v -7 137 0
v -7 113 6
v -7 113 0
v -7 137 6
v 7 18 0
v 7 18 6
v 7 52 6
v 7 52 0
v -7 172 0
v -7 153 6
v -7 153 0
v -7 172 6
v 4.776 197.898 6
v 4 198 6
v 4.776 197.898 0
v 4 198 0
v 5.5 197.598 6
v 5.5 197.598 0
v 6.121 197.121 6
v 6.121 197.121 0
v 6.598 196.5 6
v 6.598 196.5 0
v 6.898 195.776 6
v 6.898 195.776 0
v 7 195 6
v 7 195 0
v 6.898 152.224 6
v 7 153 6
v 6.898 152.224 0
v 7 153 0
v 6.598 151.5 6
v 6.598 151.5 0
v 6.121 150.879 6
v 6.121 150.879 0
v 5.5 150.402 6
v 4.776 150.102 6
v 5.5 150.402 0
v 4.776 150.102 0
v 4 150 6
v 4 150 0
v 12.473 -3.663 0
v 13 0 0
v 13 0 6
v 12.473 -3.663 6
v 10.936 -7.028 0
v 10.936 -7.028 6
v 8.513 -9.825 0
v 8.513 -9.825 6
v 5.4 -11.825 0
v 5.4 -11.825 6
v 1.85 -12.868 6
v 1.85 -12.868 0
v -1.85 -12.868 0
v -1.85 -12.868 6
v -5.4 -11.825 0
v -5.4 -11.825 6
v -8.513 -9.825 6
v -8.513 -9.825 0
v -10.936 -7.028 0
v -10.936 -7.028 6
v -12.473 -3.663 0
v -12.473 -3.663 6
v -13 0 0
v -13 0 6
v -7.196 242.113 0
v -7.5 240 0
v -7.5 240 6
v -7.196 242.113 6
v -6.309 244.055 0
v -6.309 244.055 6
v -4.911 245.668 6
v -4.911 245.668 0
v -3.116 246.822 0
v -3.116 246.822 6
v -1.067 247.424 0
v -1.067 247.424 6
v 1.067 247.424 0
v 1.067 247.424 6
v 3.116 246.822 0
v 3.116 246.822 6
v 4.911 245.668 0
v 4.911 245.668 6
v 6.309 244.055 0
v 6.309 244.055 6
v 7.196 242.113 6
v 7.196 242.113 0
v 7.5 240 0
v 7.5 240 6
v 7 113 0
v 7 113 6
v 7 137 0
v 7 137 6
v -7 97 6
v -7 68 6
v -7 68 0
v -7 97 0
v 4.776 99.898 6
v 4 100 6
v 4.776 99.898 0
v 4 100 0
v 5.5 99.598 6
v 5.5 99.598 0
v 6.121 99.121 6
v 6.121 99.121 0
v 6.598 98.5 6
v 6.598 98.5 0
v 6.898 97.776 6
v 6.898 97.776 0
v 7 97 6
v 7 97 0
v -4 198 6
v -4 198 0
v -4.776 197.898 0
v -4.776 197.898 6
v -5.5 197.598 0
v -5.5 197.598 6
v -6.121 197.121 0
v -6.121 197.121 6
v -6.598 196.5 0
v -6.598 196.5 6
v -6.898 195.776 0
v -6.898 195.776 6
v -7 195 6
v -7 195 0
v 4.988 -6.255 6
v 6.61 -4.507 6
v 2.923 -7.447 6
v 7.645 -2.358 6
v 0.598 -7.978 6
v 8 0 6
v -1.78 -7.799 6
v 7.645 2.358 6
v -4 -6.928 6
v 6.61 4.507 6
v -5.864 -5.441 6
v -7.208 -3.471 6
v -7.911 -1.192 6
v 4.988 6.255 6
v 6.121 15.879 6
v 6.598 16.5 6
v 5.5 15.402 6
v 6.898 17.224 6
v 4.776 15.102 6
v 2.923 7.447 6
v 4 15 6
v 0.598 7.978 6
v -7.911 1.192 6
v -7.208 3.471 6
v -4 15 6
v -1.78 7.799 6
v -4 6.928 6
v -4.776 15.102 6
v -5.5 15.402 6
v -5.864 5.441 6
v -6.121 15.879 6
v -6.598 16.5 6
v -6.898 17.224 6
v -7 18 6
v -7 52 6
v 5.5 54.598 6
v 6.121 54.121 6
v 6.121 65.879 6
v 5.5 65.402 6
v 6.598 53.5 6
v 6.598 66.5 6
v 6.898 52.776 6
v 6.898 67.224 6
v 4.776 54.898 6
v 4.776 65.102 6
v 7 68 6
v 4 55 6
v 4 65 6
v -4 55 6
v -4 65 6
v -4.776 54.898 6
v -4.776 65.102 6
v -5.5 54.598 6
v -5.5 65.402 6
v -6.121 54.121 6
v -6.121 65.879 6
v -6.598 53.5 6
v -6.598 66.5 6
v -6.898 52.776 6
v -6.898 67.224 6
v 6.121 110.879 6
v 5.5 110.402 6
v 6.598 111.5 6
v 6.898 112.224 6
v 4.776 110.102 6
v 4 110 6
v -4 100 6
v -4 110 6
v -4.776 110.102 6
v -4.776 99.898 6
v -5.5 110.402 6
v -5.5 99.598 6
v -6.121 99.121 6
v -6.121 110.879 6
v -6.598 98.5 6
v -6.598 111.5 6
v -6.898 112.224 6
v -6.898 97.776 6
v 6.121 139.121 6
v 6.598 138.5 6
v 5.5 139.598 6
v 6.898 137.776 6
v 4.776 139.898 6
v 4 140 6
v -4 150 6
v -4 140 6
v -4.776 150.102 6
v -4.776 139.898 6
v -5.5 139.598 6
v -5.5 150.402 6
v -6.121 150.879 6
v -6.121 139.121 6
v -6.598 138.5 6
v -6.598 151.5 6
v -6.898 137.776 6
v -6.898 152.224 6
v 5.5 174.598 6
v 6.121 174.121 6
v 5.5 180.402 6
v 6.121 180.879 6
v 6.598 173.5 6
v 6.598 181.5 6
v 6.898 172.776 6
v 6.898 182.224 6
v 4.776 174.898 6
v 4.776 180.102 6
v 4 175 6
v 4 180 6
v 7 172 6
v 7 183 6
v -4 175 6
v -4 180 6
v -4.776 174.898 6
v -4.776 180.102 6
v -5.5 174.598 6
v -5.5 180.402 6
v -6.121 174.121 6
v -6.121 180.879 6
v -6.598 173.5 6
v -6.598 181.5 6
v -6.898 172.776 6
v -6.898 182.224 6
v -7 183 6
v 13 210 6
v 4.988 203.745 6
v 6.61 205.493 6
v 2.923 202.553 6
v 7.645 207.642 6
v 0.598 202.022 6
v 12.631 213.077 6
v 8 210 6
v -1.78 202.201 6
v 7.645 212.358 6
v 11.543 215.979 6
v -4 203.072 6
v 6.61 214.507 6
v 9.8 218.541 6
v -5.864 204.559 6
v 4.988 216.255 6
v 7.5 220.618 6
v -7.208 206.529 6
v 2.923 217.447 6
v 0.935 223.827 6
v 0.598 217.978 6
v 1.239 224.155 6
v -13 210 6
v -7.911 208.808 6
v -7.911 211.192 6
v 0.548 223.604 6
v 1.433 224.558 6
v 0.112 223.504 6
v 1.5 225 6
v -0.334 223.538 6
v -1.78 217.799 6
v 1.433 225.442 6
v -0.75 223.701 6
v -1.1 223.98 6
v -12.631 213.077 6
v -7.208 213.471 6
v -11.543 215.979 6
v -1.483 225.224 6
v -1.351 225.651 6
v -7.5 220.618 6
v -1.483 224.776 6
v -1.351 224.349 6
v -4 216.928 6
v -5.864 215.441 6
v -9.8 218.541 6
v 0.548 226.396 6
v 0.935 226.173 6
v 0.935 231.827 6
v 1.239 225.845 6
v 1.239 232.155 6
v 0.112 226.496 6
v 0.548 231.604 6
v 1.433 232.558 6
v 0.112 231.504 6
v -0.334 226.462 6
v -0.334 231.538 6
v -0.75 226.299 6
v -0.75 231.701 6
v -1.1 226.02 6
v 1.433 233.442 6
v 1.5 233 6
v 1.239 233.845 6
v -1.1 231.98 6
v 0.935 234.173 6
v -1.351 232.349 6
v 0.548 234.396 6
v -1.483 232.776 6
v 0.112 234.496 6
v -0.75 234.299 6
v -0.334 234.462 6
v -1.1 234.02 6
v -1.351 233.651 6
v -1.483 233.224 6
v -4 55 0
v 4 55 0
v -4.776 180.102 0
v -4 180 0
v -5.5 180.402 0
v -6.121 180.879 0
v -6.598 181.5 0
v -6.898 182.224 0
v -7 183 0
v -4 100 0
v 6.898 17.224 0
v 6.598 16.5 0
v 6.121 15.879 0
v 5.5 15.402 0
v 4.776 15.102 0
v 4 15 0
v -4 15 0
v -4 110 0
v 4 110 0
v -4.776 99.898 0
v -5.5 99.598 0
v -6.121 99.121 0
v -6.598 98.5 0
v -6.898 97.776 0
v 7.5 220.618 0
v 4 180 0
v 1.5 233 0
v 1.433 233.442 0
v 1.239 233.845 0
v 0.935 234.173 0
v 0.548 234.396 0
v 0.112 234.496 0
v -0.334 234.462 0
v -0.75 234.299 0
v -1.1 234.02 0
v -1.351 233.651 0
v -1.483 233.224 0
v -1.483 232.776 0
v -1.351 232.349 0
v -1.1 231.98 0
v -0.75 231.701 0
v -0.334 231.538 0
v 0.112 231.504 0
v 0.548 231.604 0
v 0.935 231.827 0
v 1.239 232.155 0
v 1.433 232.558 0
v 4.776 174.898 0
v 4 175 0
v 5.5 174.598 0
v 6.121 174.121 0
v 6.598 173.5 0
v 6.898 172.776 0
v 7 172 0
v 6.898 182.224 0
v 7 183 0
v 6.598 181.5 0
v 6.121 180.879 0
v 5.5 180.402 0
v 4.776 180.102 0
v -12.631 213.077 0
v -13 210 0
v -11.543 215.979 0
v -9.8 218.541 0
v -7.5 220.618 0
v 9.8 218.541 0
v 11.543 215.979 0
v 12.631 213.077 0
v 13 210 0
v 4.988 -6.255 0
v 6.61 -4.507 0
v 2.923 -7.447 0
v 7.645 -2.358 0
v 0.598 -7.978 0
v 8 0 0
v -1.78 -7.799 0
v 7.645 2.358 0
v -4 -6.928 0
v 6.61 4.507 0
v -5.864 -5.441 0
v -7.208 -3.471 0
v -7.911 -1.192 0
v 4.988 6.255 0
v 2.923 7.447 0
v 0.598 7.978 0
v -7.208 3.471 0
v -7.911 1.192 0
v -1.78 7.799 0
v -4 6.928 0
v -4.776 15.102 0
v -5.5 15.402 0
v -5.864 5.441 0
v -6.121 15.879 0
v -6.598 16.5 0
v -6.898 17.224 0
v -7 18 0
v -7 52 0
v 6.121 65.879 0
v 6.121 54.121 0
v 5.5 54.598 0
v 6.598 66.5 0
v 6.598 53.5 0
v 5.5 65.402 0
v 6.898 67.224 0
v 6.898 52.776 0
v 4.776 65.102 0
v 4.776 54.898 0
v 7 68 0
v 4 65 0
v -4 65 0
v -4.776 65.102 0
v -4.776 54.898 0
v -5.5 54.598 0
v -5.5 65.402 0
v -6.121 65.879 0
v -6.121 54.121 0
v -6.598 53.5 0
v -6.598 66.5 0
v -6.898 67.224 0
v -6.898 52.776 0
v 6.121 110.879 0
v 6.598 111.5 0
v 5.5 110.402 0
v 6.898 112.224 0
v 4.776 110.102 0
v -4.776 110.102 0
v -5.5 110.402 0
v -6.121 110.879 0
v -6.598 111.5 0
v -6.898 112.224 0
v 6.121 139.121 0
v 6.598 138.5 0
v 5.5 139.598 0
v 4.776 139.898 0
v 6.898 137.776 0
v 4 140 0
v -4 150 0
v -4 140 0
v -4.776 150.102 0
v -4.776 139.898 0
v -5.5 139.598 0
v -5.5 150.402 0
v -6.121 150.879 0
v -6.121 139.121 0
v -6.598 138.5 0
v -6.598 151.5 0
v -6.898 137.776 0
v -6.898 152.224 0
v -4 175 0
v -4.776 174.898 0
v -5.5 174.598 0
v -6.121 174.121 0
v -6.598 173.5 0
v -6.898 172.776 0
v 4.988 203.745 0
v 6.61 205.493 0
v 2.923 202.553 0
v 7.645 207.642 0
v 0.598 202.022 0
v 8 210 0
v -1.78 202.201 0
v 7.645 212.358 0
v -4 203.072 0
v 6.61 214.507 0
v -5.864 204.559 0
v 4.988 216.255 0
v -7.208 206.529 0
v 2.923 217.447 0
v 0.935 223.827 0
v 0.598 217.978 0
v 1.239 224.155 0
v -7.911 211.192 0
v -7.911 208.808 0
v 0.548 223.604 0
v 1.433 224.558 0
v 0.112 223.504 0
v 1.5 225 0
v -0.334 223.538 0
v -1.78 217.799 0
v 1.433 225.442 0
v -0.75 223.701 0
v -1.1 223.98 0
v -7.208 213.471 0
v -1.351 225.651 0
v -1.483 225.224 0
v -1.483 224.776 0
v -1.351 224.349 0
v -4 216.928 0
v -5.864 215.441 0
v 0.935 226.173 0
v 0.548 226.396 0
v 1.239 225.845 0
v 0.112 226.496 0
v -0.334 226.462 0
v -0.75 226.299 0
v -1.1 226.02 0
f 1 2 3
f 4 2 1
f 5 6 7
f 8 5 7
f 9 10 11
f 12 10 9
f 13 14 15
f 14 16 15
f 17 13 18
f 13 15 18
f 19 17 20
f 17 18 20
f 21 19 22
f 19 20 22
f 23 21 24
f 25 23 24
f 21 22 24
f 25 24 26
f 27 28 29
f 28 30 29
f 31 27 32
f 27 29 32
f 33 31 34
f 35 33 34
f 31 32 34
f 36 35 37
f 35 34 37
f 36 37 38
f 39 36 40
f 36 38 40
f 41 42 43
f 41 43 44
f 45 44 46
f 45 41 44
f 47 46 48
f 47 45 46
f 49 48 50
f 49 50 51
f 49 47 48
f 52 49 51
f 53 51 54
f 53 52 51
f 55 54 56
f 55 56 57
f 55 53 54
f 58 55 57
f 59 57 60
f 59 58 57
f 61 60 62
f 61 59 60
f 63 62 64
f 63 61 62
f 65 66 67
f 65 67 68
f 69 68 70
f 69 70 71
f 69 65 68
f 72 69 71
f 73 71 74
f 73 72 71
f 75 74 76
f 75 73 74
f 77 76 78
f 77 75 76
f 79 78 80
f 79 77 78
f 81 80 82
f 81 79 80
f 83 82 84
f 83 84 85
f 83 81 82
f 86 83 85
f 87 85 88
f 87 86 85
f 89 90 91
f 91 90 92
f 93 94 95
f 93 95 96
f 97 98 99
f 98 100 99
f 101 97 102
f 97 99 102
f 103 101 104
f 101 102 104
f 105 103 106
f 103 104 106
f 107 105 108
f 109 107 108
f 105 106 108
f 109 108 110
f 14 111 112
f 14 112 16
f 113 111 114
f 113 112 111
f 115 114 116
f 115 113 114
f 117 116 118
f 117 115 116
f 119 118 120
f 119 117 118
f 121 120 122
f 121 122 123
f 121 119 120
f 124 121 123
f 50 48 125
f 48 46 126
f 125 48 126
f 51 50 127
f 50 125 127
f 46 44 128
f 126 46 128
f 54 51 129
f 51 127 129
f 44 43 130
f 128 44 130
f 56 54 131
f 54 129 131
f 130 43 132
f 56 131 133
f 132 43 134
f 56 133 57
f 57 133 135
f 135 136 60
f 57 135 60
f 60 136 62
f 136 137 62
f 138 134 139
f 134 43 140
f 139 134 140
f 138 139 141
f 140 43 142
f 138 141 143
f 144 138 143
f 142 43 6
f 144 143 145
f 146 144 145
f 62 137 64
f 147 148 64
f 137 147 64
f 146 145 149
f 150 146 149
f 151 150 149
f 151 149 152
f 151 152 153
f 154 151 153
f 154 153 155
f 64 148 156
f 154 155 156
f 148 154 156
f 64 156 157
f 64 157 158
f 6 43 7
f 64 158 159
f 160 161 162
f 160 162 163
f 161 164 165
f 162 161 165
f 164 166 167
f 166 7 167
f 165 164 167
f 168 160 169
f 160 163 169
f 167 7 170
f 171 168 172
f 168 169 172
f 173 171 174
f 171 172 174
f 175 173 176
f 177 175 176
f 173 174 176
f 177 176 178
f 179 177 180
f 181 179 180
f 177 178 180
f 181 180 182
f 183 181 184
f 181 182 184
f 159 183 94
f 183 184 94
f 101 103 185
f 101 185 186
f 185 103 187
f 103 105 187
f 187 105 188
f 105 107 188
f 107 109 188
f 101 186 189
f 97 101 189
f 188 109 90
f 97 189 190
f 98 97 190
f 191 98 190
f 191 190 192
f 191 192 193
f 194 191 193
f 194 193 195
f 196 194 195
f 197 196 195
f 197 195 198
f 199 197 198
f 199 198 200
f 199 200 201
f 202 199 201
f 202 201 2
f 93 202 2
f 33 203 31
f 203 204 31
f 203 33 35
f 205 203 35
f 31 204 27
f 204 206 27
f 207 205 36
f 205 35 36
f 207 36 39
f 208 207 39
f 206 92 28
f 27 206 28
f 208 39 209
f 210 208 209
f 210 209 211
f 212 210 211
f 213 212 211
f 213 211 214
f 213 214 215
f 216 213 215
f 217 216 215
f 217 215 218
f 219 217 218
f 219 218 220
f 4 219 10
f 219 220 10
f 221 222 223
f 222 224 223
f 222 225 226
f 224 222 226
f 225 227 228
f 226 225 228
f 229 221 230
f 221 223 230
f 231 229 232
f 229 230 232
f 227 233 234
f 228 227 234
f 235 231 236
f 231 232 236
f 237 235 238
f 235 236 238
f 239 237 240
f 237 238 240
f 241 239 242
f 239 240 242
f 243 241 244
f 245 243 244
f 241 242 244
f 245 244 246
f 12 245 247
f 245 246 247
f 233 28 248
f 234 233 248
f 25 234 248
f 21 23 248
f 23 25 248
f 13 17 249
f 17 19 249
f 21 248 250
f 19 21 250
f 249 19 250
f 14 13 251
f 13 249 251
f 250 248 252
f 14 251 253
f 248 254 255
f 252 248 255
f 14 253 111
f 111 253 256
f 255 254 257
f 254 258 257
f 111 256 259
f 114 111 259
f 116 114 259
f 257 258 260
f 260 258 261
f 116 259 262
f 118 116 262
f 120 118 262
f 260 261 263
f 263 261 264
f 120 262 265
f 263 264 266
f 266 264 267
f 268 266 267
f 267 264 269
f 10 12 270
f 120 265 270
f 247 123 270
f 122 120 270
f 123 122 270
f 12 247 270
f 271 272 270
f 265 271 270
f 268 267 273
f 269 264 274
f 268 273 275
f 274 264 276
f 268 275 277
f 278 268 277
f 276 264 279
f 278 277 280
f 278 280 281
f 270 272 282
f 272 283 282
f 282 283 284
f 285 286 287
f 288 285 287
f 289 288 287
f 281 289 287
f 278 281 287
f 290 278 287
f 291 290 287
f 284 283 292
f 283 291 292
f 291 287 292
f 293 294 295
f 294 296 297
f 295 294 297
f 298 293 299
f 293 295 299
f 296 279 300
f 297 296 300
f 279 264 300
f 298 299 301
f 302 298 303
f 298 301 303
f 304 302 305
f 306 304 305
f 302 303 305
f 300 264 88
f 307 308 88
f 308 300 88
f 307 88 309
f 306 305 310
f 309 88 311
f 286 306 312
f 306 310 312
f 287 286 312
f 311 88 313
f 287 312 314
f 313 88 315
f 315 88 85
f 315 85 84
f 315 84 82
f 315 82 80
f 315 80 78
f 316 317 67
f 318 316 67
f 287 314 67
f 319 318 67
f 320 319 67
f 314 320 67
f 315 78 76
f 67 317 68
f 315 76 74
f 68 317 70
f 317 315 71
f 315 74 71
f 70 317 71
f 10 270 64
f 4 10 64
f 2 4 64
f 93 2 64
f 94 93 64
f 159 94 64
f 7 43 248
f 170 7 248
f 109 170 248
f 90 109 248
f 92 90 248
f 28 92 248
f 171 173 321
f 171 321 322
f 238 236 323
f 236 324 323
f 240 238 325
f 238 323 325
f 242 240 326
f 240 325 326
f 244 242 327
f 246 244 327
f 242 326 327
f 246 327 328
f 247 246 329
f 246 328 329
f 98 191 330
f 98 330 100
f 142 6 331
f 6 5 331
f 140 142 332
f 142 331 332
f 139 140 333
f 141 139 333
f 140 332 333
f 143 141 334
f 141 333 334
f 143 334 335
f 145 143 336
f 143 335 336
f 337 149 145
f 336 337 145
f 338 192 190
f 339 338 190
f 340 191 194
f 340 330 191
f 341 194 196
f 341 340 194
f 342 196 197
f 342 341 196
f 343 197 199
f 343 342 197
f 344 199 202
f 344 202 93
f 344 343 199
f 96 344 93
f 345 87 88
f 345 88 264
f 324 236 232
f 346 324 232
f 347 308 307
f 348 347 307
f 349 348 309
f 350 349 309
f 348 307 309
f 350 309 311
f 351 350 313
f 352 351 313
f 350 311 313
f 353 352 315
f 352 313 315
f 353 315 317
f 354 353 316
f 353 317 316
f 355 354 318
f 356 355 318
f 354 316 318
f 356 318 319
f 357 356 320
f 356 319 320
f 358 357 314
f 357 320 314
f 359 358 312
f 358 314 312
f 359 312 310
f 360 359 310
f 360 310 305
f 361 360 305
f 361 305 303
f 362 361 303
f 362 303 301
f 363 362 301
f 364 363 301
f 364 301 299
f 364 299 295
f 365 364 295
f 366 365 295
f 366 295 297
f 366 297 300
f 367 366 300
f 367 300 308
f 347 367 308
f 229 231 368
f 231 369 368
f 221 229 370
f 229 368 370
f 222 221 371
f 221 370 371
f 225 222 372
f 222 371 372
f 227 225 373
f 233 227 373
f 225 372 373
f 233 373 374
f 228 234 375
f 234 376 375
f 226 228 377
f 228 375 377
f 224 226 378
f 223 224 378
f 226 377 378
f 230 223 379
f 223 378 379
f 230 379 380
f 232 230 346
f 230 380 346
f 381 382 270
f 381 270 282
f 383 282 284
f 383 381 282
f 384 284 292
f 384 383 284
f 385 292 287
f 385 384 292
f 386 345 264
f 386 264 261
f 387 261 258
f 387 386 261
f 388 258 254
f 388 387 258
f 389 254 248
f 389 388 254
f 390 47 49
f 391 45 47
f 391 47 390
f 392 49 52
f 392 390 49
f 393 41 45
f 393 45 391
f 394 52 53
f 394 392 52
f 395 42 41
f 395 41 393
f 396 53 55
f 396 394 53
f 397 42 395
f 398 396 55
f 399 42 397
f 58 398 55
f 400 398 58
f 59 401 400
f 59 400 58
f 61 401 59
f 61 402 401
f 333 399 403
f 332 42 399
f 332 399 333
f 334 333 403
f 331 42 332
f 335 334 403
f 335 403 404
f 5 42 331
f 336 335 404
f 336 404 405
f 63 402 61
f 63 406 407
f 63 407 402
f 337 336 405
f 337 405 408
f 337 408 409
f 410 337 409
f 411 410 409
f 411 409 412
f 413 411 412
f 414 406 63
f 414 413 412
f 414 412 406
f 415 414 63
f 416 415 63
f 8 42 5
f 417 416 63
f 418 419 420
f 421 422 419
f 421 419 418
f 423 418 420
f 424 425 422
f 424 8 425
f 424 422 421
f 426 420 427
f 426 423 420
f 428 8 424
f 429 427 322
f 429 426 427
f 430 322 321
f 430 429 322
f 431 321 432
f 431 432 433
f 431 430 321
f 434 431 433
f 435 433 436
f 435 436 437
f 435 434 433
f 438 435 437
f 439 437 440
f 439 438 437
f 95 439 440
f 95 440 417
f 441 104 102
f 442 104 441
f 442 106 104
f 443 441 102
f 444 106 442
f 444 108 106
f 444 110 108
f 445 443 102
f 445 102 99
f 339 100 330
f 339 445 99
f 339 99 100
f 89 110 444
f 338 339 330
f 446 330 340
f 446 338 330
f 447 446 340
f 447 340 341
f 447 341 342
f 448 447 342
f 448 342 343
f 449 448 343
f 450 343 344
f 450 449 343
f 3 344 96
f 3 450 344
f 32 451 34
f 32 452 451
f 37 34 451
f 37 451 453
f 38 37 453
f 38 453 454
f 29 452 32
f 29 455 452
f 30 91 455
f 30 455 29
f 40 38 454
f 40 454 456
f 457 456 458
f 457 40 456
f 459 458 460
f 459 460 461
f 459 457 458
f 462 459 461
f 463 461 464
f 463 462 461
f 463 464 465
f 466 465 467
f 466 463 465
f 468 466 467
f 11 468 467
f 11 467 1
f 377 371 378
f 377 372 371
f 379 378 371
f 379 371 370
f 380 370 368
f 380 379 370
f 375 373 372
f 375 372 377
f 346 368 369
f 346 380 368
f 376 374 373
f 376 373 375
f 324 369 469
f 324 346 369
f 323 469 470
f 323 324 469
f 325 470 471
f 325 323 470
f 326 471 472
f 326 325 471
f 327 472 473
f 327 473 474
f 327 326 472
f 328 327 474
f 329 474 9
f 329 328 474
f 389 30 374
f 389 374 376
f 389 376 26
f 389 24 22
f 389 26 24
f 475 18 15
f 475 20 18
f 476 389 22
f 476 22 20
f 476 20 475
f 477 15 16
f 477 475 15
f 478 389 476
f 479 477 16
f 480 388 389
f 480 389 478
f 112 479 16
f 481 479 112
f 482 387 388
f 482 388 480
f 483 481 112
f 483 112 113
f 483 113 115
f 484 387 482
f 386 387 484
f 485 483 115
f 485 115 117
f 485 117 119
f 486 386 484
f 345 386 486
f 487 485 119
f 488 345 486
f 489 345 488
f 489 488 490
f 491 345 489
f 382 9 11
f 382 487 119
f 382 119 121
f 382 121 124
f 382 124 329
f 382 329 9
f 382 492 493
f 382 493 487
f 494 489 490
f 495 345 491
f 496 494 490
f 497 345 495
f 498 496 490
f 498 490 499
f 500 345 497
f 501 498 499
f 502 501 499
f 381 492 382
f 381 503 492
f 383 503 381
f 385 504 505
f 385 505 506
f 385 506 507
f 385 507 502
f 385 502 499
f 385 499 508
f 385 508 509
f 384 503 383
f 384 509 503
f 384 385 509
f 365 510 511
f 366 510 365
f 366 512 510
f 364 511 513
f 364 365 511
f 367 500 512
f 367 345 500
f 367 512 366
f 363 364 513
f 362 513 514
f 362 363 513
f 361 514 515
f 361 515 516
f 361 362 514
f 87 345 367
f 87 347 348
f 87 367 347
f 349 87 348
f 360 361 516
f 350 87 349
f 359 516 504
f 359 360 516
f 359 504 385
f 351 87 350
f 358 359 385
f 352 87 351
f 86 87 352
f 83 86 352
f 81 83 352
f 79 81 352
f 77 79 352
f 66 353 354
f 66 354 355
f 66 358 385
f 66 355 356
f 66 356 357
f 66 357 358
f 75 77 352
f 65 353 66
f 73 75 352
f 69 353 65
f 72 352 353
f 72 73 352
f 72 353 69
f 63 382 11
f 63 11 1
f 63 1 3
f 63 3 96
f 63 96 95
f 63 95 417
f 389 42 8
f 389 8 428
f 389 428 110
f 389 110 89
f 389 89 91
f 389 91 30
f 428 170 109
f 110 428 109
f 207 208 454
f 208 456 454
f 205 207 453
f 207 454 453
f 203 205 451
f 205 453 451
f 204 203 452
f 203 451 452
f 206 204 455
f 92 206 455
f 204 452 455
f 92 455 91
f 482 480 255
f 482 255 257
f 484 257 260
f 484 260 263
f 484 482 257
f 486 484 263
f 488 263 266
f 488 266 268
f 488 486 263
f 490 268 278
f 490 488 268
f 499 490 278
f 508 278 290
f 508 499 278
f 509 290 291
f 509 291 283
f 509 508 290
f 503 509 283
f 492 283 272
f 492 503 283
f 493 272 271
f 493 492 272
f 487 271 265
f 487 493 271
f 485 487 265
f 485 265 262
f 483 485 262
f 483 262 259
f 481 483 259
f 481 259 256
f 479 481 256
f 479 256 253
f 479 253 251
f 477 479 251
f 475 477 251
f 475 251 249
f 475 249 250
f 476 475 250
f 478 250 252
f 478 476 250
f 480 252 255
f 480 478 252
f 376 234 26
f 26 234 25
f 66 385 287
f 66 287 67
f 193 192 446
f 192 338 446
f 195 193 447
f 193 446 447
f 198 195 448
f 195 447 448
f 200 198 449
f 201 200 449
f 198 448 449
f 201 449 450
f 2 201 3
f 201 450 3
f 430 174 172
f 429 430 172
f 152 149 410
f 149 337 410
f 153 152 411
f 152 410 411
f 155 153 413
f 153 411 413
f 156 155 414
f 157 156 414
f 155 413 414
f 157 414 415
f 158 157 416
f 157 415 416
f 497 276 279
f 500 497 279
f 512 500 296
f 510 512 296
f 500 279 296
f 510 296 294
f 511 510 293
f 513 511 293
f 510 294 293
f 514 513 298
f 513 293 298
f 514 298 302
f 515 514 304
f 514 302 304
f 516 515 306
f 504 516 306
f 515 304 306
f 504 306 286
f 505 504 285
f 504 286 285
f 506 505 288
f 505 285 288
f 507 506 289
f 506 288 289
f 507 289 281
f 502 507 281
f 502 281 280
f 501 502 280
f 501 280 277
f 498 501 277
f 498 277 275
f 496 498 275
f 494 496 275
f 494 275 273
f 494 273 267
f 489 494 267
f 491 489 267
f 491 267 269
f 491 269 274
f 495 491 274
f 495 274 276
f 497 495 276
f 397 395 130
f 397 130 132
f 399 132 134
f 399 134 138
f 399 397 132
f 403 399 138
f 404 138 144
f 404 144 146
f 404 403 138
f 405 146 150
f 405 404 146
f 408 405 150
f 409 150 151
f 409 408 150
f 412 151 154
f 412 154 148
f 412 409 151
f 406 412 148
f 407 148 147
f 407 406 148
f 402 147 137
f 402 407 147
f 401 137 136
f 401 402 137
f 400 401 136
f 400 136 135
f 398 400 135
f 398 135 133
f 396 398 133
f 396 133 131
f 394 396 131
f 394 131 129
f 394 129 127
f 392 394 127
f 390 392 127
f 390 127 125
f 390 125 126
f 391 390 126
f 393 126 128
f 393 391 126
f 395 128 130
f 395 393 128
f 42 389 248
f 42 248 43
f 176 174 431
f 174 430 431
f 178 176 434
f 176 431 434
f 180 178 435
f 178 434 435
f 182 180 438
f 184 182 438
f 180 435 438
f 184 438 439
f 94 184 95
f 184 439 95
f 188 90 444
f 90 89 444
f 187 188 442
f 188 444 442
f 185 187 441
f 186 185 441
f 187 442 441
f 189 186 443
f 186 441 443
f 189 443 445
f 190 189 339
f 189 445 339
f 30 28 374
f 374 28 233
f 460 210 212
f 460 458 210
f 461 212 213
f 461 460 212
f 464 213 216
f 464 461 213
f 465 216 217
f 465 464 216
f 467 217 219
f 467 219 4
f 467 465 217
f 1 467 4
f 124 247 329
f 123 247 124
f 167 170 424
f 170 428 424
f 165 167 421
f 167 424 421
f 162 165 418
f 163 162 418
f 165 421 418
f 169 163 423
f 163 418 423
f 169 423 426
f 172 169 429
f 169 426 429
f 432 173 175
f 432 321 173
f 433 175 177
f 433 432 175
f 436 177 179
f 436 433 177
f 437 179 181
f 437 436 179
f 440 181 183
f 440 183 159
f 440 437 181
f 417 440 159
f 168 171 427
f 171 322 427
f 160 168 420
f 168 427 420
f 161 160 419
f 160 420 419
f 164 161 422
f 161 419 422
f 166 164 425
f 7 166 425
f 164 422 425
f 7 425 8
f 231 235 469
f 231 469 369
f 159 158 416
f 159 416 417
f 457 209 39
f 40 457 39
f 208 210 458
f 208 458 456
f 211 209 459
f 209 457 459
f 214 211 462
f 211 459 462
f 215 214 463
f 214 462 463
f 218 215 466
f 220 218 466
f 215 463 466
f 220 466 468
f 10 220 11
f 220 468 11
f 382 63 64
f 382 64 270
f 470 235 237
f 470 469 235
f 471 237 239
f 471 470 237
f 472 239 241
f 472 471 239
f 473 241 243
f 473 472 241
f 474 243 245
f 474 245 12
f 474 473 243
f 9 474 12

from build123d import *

# Parameters (mm, degrees)
SKETCH_1_R          = 8
EXTRUDE_1_DEPTH     = 6
SKETCH_2_R          = 1.5
SKETCH_2_W          = 14
SKETCH_2_H          = 25
SKETCH_2_H_2        = 30
SKETCH_2_H_3        = 35
SKETCH_2_H_4        = 40
SKETCH_2_H_5        = 18
CUT_EXTRUDE_1_DEPTH = 248.913795502
FILLET_1_R          = 3


with BuildPart() as part:
    # 草图1 → 凸台-拉伸1 (new body)
    with BuildSketch(Plane.XY):
        with BuildLine():
            Line((-13, 0), (-13, 210))
            ThreePointArc((-13, 210), (-11.543396381, 215.979130372), (-7.5, 220.618380291))
            Line((-7.5, 220.618380291), (-7.5, 240))
            ThreePointArc((-7.5, 240), (0, 247.5), (7.5, 240))
            Line((7.5, 240), (7.5, 220.618380291))
            ThreePointArc((7.5, 220.618380291), (11.543396381, 215.979130372), (13, 210))
            Line((13, 210), (13, 0))
            ThreePointArc((13, 0), (0, -13), (-13, 0))
        make_face()
        Circle(SKETCH_1_R, mode=Mode.SUBTRACT)
        with Locations((0, 210)):
            Circle(SKETCH_1_R, mode=Mode.SUBTRACT)
    extrude(amount=EXTRUDE_1_DEPTH)

    # 草图2 → 切除-拉伸1 (cut, through all)
    with BuildSketch(Plane.XY.offset(6)):
        with Locations((0, 233)):
            Circle(SKETCH_2_R)
        with Locations((0, 225)):
            Circle(SKETCH_2_R)
        with Locations((0, 162.5)):
            Rectangle(SKETCH_2_W, SKETCH_2_H)
        with Locations((0, 125)):
            Rectangle(SKETCH_2_W, SKETCH_2_H_2)
        with Locations((0, 82.5)):
            Rectangle(SKETCH_2_W, SKETCH_2_H_3)
        with Locations((0, 35)):
            Rectangle(SKETCH_2_W, SKETCH_2_H_4)
        with Locations((0, 189)):
            Rectangle(SKETCH_2_W, SKETCH_2_H_5)
    extrude(amount=-CUT_EXTRUDE_1_DEPTH, mode=Mode.SUBTRACT)

    # 圆角1
    fillet_1_edges = [part.edges().sort_by_distance(p)[0] for p in [
        (7, 55, 3),
        (7, 15, 3),
        (-7, 15, 3),
        (-7, 55, 3),
        (7, 100, 3),
        (7, 65, 3),
        (-7, 65, 3),
        (-7, 100, 3),
        (7, 140, 3),
        (7, 110, 3),
        (-7, 110, 3),
        (-7, 140, 3),
        (7, 198, 3),
        (7, 180, 3),
        (-7, 180, 3),
        (-7, 198, 3),
        (7, 175, 3),
        (7, 150, 3),
        (-7, 150, 3),
        (-7, 175, 3),
    ]]
    fillet(fillet_1_edges, radius=FILLET_1_R)


solid = part.part
